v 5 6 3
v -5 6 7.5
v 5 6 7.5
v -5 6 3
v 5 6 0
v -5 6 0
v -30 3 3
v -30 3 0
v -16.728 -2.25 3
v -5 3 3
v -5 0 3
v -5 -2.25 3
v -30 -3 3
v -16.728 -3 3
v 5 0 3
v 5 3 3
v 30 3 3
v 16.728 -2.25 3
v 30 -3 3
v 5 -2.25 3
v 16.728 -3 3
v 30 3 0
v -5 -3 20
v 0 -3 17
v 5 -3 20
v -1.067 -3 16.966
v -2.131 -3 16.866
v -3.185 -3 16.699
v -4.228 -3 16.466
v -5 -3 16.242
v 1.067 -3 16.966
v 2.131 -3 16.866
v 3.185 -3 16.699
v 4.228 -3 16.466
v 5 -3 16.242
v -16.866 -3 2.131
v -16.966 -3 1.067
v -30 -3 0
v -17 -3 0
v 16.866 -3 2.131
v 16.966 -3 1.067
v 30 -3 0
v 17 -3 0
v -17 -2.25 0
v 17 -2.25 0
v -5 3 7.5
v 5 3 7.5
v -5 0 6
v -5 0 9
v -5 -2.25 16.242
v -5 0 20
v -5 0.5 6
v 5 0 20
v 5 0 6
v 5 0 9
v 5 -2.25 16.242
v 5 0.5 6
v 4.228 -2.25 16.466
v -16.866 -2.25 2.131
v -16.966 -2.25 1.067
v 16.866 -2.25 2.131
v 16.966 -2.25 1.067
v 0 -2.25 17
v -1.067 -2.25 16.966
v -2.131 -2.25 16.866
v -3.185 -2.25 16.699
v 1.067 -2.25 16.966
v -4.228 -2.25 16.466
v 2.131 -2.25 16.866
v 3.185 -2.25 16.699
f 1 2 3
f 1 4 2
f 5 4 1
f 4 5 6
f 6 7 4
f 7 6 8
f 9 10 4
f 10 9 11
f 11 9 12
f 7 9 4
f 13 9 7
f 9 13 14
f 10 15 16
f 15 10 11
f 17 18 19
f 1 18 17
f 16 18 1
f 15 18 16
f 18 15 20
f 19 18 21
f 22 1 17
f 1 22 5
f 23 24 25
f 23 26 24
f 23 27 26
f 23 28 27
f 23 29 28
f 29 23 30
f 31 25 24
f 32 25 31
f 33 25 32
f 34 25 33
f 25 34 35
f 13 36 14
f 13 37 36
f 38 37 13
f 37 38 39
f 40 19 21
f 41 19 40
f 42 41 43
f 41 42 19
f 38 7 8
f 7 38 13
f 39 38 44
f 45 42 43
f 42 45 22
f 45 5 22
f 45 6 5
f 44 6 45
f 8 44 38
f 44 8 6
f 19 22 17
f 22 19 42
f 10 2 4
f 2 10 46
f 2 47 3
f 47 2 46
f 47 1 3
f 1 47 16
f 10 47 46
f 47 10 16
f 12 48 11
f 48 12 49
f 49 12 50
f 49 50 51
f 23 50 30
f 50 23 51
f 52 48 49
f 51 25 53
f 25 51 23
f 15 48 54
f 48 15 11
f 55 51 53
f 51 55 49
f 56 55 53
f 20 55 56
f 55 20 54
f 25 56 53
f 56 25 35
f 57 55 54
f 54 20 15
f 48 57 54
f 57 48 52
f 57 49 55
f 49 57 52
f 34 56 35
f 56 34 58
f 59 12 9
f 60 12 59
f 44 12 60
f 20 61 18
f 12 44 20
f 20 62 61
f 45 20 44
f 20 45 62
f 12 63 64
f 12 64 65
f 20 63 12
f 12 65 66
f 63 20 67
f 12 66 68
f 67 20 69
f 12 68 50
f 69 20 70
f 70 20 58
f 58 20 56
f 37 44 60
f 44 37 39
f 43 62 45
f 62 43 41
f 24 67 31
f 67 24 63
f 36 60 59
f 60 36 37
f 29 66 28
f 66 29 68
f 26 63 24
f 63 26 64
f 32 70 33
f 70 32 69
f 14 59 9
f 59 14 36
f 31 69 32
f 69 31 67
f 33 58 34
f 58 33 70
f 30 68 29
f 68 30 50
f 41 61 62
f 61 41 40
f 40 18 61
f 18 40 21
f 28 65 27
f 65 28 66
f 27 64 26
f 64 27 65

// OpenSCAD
// file: common.scad
$fn = 100;

function outer_diam(d, fn=$fn) = 1/cos(180/fn) * d;

// gear
gear_diam = 90;
gear_thickness = 4;
gear_spur_depth = 2;
gear_rim_width = 3;

// stand (vertical beam with servo mount)
gear_diameter = gear_diam;
body_length = 23.2;
body_width = 12.5;
body_height = 22.6;
mount_height = 2.8;
mount_offset = 21 - mount_height;
mount_length = 32.5;
gear_hood_diam = 12;
gear_hood_height = 5.7;
arm_spacing = 2.5;
mount_hole_diam = 1.75;
mount_hole_offset = (27.8 - body_length)/2;
stand_rim_width = 3;
stand_thickness = 3;
stand_height = 120;
stand_width = 10;
// main file
include <common.scad>;

foot_length = 3 * stand_width;
foot_length = gear_diam * 2/3;
foot_clip_height = 0.5;
foot_width = 2 * stand_width;

module foot() {
  difference() {
    union() {
      // foot
      linear_extrude(height = stand_thickness) {
        hull() {
          translate([-stand_width/2, stand_rim_width])
            square([stand_width, stand_thickness]);

          translate([-foot_length/2, -stand_thickness])
            square([foot_length, 2 * stand_thickness]);
        }
      }

      // hook
      linear_extrude(height = 2.5 * stand_thickness)
        translate([-stand_width/2, stand_rim_width])
          square([stand_width, stand_thickness]);

      // base
      linear_extrude(height = foot_width) {
        translate([-stand_width/2, -stand_thickness])
          square([stand_width, stand_thickness]);
      }

      // clip
      translate([-stand_width/2, 0, 2 * stand_thickness])
        rotate([90, 0, 90])
          linear_extrude(height = stand_width)
            polygon([
              [0, 0],
              [foot_clip_height, 0],
              [0, stand_thickness]
            ]);
    }

    // base cutout to get three point stand.
    translate([0, -stand_thickness, 0])
      rotate([-90, 0, 0])
        cylinder(d=foot_width * 2 - 2 * stand_thickness, h=stand_thickness/4);
  }
}

foot();
